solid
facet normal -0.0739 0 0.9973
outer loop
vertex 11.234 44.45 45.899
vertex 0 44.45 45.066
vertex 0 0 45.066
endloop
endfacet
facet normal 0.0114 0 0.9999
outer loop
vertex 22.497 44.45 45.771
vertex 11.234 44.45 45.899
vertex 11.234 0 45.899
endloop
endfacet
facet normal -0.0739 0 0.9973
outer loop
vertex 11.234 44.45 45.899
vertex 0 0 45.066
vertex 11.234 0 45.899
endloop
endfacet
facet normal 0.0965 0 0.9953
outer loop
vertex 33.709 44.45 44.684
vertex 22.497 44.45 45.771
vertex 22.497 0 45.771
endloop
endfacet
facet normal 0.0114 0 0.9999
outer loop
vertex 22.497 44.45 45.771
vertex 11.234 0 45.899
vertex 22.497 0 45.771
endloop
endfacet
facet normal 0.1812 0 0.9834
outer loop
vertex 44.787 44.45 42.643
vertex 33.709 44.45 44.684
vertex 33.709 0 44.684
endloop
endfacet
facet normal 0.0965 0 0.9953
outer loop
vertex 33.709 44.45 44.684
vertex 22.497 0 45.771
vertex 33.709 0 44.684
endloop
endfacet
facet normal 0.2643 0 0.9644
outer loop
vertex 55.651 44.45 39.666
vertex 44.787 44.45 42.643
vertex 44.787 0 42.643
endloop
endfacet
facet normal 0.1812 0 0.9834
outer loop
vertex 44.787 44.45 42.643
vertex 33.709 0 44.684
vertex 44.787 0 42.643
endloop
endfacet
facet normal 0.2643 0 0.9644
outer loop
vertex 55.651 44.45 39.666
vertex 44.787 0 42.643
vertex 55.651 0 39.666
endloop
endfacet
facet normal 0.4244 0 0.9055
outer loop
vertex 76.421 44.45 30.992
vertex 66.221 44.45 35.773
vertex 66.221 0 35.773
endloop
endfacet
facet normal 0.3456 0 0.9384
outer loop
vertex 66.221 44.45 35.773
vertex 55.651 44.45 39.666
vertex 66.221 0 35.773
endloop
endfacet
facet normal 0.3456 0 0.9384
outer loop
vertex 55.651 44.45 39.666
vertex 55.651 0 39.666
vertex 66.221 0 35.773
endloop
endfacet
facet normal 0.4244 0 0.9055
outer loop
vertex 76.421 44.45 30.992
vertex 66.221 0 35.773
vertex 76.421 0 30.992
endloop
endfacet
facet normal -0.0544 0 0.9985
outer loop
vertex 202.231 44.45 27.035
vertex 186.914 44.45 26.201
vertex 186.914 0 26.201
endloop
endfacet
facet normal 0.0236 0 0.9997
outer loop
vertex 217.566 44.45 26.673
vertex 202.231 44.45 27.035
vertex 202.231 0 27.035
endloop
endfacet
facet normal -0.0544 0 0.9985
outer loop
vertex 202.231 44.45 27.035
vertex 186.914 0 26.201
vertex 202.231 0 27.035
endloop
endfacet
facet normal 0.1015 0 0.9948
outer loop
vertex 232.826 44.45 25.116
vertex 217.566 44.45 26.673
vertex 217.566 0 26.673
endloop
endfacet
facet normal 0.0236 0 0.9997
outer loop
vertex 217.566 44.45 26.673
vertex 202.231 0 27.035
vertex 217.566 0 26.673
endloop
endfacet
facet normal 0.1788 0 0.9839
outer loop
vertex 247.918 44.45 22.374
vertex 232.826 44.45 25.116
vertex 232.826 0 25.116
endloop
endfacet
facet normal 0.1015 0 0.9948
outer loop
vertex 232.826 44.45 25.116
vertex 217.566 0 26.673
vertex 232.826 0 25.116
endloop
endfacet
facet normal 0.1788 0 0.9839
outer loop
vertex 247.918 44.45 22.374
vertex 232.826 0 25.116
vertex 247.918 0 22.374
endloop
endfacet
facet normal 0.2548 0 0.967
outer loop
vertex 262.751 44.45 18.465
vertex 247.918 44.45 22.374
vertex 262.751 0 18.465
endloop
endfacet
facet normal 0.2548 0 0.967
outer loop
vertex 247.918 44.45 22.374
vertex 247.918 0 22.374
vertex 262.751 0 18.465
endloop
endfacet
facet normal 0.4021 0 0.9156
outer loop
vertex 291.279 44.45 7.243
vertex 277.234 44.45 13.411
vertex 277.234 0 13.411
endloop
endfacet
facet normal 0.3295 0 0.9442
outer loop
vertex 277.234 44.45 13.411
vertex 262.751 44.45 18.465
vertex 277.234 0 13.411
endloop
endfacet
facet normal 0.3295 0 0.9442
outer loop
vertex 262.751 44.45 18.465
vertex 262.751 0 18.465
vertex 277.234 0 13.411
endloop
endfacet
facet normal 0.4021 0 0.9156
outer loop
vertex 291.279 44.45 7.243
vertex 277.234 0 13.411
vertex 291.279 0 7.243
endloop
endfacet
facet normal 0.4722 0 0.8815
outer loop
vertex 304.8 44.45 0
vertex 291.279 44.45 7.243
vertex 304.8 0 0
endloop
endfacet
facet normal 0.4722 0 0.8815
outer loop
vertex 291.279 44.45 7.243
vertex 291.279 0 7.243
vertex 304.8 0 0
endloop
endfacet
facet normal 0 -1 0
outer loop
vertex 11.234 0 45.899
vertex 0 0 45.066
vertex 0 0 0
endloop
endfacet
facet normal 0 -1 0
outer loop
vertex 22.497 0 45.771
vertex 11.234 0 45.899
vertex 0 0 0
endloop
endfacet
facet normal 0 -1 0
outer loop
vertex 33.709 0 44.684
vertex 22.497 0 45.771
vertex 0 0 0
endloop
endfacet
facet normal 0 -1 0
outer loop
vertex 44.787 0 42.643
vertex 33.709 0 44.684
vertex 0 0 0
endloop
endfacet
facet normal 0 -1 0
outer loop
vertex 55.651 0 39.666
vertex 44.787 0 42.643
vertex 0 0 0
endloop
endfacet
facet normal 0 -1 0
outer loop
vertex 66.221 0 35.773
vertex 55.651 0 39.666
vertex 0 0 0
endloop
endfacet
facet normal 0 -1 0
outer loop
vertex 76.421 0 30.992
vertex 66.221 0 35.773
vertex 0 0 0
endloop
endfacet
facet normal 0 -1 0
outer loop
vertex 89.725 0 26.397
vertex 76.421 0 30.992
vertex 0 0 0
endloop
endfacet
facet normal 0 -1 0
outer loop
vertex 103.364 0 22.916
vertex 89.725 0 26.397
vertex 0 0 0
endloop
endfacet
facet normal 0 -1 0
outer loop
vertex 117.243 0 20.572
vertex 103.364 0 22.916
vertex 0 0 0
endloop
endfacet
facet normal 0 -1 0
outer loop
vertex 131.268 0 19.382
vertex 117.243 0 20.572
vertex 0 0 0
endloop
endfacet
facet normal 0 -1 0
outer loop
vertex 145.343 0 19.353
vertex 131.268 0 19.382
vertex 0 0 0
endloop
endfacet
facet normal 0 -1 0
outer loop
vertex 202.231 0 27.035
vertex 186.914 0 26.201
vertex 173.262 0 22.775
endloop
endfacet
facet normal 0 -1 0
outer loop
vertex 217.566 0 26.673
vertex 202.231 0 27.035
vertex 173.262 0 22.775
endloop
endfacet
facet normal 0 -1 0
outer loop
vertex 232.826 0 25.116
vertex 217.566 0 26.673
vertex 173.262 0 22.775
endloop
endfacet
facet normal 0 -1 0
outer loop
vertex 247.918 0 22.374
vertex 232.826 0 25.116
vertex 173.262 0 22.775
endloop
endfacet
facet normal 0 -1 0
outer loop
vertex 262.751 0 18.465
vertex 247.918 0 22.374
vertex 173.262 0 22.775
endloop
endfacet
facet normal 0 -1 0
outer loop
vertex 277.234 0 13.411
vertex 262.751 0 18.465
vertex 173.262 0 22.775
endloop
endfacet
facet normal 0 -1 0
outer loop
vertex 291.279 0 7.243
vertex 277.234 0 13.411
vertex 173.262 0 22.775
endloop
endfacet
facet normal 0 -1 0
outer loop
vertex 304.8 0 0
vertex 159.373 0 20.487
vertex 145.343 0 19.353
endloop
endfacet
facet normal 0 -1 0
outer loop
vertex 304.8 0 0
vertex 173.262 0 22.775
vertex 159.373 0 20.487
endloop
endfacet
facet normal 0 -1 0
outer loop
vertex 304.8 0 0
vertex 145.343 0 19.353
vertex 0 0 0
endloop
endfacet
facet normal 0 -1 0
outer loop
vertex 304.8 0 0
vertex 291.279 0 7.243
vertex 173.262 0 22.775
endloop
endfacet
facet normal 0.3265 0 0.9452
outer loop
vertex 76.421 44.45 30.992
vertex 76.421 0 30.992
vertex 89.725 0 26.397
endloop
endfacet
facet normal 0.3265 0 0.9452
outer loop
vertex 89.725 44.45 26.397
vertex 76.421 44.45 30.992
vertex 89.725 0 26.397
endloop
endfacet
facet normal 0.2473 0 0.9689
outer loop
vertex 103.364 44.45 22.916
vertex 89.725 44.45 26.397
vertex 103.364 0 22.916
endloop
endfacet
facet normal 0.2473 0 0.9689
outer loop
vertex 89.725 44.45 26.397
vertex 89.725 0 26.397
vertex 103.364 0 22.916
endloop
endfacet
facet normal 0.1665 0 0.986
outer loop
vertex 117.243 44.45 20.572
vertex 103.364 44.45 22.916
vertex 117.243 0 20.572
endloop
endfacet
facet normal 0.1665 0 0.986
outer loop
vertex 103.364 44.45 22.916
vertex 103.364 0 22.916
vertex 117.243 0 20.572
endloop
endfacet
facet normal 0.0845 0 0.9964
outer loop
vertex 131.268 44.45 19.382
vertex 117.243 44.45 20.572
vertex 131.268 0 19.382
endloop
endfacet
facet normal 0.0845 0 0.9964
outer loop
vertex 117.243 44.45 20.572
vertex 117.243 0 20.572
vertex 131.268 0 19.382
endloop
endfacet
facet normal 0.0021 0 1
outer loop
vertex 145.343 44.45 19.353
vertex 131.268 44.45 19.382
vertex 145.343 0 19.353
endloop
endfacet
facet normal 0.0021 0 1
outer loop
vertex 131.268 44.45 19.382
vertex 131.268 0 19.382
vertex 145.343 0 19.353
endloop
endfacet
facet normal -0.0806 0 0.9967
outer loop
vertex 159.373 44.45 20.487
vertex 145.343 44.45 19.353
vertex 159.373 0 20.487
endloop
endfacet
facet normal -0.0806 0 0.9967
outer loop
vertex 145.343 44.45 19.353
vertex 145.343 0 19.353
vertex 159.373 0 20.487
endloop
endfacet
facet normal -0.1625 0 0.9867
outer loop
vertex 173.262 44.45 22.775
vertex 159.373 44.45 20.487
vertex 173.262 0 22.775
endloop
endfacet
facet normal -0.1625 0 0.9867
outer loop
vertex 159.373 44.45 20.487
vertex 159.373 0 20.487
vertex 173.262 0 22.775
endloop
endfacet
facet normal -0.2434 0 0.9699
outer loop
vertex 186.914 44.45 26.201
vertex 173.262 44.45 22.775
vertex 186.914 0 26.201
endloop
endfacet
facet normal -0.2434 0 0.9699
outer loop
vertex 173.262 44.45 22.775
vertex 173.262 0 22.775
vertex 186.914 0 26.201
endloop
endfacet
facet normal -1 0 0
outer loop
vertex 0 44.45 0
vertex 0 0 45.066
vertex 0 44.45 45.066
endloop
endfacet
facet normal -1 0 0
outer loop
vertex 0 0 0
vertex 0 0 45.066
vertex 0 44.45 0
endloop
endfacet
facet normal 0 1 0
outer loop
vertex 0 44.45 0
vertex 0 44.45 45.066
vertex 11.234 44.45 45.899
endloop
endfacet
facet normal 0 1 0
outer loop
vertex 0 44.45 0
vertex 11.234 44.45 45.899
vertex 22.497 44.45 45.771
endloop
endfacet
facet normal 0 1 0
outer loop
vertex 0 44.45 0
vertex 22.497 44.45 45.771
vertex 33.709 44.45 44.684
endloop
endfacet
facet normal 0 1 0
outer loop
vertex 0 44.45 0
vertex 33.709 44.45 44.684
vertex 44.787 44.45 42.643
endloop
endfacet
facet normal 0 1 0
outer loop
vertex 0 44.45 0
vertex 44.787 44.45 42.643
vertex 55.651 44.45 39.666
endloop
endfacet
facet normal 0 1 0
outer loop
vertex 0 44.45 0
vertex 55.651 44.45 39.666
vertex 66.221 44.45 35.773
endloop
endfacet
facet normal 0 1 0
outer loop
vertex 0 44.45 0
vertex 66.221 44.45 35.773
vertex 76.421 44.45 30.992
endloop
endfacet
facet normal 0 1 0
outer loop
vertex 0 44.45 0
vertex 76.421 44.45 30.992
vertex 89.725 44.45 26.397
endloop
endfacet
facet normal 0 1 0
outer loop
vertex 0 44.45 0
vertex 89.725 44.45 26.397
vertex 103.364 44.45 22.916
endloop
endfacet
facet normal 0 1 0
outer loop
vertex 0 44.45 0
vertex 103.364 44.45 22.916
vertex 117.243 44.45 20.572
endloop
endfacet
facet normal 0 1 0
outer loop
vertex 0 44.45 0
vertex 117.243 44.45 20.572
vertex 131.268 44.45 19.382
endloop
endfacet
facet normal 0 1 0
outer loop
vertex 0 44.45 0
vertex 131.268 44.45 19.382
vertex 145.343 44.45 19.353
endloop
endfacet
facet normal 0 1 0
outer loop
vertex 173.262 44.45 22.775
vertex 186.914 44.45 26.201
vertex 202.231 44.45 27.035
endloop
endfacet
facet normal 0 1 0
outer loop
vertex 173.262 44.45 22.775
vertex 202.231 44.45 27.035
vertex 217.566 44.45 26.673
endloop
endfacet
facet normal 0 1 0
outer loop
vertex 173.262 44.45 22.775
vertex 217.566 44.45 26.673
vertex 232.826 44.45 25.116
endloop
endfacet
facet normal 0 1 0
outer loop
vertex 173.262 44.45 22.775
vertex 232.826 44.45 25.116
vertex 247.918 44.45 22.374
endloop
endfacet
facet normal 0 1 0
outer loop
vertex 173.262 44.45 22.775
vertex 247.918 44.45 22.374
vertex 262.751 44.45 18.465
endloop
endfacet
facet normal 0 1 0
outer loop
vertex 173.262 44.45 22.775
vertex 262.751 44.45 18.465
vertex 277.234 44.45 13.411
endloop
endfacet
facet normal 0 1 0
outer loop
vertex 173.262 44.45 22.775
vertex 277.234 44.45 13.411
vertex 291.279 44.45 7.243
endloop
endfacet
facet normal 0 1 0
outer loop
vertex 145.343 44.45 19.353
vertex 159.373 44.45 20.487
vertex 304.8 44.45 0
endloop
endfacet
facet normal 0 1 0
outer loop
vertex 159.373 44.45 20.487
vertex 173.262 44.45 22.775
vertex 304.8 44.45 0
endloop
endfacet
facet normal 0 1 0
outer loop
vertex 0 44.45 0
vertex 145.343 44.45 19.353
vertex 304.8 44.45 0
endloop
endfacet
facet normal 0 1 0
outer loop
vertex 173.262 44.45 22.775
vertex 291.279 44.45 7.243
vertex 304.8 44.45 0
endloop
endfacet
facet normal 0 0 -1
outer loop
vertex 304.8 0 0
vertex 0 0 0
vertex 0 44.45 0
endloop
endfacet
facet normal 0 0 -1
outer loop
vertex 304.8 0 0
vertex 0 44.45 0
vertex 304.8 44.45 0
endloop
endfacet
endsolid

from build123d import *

# Parameters (mm, degrees)
F1_DEPTH = 44.45
F3_DEPTH = 50.8


with BuildPart() as f1:
    # F0 (on Front) → F1 (new body)
    with BuildSketch(Plane.XZ):
        Polygon((0, 69.85), (0, 0), (304.8, 0), (304.8, 19.05), align=None)
    extrude(amount=-F1_DEPTH)

    # F2 (on face) → F3 (cut)
    with BuildSketch(Plane.XZ):
        with BuildLine():
            ThreePointArc((0, 45.065515), (39.269991, 43.781798), (76.421015, 30.991899))
            ThreePointArc((76.421015, 30.991899), (131.267893, 19.381868), (186.913863, 26.200881))
            ThreePointArc((186.913863, 26.200881), (247.918131, 22.374434), (304.8, 0))
            Line((304.8, 0), (304.8, 19.05))
            Line((304.8, 19.05), (0, 69.85))
            Line((0, 69.85), (0, 45.065515))
        make_face()
    extrude(amount=-F3_DEPTH, mode=Mode.SUBTRACT)


solid = f1.part
